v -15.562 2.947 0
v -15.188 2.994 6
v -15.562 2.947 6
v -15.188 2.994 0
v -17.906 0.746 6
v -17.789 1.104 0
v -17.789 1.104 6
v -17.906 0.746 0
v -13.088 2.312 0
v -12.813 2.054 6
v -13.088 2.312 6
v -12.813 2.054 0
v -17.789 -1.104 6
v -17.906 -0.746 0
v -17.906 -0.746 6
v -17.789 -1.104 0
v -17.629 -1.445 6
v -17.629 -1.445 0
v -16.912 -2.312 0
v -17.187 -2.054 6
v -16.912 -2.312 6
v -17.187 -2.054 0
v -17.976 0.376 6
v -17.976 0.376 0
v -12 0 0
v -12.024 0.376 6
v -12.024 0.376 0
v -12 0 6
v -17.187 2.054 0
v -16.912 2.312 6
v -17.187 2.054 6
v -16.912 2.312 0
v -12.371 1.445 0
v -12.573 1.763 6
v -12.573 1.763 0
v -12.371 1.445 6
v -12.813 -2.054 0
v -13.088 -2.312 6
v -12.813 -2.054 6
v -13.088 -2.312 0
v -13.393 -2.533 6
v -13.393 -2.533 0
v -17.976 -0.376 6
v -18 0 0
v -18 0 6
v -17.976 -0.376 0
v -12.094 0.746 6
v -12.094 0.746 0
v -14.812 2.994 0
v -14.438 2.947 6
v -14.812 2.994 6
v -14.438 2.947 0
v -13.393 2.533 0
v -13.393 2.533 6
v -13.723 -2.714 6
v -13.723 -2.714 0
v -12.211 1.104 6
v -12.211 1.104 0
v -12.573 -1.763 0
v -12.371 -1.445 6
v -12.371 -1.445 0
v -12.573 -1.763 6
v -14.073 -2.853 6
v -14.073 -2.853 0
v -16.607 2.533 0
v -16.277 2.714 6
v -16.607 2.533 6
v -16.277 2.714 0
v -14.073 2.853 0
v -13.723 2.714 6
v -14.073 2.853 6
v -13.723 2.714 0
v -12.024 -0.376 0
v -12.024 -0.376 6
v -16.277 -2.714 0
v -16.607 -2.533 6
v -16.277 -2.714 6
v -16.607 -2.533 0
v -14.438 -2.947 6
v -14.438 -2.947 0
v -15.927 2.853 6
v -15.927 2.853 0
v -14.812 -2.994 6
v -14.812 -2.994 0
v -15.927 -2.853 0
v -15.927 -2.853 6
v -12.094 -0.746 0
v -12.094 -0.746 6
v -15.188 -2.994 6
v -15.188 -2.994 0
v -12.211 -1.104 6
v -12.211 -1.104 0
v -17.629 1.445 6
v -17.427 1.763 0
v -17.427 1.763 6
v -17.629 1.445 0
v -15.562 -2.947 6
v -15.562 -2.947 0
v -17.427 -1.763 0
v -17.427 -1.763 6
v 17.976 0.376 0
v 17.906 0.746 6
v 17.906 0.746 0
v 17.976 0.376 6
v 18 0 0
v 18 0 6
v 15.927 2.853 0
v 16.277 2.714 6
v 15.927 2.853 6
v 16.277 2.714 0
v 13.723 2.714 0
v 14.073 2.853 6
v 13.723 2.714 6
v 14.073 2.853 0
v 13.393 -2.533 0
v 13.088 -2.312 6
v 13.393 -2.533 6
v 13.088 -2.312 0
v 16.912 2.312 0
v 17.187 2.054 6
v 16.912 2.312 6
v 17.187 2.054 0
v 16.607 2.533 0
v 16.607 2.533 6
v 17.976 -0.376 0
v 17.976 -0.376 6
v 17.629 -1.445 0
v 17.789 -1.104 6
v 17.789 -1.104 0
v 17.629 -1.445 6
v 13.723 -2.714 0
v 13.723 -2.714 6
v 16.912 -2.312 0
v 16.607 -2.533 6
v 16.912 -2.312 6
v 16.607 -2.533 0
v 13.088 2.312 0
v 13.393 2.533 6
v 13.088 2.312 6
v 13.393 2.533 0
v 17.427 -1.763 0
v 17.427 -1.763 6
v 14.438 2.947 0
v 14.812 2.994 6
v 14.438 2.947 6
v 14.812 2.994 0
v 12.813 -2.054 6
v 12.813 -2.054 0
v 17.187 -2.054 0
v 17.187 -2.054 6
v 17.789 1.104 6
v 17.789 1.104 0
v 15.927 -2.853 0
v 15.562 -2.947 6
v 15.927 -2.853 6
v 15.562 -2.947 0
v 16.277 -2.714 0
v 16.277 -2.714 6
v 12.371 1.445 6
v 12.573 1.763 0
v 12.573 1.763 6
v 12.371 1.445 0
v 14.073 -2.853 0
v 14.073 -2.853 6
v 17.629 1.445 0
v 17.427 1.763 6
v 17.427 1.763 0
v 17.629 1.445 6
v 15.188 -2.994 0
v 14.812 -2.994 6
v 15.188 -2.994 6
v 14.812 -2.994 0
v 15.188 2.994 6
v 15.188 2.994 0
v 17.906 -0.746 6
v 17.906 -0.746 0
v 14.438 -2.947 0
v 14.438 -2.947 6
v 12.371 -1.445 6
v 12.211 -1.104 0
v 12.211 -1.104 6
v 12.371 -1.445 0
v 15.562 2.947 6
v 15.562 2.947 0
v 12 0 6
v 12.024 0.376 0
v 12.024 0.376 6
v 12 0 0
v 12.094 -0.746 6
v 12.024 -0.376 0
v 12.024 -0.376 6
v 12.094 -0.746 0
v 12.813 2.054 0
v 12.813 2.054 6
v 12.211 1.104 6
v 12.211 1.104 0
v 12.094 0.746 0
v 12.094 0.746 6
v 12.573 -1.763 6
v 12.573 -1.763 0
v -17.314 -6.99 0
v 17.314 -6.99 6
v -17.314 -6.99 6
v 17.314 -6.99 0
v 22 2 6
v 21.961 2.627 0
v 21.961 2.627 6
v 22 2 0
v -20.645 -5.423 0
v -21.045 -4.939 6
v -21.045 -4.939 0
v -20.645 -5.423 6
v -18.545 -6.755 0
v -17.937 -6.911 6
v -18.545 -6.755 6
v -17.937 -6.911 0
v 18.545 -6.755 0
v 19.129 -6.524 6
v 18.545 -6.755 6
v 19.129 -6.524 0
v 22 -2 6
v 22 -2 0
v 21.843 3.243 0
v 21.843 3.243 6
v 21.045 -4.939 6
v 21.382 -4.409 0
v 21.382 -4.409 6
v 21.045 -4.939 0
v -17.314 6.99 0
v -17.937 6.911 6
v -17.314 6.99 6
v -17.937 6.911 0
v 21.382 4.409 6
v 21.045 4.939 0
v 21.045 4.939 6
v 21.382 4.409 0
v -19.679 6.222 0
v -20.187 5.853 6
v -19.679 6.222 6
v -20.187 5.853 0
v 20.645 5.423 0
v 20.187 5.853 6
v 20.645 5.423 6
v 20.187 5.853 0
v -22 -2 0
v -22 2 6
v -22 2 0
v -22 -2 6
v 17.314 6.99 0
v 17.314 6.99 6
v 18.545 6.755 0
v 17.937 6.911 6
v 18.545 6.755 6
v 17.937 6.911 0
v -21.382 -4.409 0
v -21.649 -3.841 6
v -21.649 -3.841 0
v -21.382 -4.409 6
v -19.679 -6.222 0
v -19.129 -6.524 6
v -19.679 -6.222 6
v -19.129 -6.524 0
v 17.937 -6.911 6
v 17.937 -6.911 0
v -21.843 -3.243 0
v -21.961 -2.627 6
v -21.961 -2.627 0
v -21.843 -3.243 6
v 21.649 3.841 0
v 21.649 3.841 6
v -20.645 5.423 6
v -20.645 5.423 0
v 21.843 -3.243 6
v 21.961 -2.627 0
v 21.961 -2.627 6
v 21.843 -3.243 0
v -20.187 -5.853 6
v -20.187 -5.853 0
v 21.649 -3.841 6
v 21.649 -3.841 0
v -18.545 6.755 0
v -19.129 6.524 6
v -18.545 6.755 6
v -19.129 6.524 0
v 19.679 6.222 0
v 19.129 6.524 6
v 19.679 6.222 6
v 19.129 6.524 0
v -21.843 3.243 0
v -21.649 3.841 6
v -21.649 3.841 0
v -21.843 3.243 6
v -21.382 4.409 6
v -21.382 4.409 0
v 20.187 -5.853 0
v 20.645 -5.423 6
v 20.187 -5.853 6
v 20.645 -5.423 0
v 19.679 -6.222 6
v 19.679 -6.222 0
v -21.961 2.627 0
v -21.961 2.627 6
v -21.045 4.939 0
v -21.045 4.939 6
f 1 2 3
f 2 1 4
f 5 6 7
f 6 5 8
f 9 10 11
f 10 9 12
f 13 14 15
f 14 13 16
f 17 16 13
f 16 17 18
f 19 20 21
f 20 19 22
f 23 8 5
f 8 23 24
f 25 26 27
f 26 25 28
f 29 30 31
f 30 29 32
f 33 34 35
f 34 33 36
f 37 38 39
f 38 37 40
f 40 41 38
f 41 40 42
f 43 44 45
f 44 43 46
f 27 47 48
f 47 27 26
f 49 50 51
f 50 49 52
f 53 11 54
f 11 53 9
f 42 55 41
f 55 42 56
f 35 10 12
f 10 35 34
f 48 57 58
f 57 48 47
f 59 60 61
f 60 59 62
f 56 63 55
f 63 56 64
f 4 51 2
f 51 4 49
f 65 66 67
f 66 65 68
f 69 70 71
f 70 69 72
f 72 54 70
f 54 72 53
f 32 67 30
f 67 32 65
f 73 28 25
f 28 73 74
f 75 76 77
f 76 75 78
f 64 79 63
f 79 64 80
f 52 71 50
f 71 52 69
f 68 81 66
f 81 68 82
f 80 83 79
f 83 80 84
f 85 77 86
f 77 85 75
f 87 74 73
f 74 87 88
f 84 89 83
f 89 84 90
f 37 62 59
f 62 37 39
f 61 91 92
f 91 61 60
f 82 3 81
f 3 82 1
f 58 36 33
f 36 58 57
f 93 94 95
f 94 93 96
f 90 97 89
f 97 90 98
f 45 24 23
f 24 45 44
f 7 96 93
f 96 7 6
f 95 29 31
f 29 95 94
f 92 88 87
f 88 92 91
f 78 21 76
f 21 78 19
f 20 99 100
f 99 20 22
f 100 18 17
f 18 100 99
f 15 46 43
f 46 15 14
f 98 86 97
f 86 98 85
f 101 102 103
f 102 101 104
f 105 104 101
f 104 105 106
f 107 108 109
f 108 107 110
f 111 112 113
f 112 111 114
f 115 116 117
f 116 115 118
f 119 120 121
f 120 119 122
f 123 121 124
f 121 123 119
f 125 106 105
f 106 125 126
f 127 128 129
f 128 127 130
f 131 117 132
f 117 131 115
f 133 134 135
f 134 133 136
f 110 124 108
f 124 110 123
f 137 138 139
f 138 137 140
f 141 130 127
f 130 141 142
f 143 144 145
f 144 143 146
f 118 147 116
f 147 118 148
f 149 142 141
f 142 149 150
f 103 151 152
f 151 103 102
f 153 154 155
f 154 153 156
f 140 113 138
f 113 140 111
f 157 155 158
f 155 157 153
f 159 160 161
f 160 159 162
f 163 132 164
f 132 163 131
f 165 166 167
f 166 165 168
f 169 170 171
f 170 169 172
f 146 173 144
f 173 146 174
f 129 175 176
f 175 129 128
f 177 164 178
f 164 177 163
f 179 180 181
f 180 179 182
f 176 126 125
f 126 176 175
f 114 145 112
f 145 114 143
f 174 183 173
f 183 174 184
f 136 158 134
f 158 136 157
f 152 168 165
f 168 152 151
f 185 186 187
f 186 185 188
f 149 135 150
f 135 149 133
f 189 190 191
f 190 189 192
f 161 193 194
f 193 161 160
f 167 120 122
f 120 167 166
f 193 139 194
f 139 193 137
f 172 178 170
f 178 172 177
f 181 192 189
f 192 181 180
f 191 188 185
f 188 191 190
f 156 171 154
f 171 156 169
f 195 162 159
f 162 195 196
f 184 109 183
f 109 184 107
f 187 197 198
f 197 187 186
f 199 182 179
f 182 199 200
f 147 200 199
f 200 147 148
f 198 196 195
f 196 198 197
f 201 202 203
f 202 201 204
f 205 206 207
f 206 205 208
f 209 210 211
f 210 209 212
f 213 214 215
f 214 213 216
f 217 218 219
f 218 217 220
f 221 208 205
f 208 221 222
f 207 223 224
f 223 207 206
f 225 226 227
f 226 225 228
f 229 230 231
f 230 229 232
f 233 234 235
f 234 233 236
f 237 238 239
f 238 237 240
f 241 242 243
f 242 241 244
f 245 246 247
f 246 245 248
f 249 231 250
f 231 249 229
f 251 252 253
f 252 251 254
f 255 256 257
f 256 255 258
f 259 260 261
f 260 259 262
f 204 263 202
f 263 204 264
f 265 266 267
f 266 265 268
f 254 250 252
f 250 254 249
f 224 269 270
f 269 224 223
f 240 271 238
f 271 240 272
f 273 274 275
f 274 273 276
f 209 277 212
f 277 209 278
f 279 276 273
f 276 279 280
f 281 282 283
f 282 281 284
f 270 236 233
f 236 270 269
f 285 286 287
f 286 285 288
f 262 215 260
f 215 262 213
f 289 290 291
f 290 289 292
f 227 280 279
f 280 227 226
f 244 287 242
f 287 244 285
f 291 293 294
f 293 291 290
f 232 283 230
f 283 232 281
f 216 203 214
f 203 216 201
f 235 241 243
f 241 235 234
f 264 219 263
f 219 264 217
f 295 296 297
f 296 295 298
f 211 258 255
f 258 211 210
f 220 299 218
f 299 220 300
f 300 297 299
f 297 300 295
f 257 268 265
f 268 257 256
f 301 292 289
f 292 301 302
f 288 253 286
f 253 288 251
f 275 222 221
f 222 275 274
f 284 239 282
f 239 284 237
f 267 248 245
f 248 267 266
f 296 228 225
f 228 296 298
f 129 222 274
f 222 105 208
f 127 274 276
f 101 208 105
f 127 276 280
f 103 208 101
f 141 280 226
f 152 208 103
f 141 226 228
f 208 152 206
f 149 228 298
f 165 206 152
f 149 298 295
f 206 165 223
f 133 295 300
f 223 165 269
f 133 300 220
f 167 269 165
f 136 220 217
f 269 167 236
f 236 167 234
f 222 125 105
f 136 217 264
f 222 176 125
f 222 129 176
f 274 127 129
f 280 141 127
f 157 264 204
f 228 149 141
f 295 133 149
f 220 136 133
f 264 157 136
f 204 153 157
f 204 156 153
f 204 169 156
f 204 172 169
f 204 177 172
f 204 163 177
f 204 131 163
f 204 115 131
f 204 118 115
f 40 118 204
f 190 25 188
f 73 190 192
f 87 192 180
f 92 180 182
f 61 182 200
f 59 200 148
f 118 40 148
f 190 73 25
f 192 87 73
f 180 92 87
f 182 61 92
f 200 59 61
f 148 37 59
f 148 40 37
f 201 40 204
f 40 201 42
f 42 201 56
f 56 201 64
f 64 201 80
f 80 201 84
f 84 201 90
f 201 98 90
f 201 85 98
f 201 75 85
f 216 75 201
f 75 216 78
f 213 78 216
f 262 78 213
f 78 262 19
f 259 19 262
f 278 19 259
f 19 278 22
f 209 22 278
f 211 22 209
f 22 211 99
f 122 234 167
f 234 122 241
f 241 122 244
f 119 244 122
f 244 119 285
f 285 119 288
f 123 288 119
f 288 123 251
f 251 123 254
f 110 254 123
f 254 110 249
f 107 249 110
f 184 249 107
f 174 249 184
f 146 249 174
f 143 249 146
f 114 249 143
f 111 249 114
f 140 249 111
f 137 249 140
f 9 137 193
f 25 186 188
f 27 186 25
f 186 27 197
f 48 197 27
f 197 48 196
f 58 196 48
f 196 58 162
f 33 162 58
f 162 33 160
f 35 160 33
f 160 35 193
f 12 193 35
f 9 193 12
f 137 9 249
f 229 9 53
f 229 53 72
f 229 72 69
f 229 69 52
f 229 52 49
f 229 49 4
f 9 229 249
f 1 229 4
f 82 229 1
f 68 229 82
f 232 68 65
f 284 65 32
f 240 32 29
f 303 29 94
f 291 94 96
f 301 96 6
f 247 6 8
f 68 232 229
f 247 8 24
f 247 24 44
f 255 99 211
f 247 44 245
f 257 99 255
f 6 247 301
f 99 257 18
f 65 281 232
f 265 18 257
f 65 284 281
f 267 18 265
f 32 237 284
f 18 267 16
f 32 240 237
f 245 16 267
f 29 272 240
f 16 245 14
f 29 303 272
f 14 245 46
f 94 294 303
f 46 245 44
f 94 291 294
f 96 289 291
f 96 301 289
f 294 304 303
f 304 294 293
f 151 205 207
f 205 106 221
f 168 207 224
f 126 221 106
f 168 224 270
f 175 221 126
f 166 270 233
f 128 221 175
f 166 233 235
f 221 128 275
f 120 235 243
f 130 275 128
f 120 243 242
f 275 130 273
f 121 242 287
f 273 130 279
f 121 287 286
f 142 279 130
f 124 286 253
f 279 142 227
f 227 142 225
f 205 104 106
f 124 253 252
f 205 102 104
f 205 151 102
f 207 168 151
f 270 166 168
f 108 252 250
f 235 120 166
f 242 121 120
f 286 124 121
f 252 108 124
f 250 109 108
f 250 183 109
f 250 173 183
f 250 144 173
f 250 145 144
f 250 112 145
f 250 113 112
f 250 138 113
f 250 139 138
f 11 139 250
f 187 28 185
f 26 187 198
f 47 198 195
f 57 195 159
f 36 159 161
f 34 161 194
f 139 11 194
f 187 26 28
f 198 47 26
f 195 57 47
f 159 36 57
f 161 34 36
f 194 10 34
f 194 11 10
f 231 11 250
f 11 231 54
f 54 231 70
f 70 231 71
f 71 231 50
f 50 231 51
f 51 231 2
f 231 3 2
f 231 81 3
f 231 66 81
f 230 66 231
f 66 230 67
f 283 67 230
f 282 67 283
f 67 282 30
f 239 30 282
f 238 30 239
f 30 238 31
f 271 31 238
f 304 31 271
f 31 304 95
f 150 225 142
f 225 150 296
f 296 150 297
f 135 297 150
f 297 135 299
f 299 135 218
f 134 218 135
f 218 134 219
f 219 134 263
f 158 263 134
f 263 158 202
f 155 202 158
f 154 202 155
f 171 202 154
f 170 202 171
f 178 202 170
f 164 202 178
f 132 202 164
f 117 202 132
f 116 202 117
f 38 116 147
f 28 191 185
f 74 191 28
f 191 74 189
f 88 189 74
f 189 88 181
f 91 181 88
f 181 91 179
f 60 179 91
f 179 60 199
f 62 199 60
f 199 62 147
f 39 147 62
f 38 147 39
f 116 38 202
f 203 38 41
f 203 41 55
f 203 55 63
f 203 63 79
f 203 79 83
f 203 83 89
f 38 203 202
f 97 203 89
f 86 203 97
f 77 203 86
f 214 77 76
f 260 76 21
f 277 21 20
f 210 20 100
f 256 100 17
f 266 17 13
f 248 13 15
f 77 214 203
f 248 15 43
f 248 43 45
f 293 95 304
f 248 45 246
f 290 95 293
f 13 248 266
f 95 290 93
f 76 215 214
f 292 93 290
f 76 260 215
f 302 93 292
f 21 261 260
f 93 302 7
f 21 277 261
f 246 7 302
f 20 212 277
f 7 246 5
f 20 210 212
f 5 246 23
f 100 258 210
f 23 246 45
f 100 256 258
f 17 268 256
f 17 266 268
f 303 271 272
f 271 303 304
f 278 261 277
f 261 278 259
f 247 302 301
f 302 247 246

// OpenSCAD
$fn = 50;


difference() {
	union() {
		hull() {
			translate(v = [-17.0000000000, 2.0000000000, 0]) {
				cylinder(h = 6, r = 5);
			}
			translate(v = [17.0000000000, 2.0000000000, 0]) {
				cylinder(h = 6, r = 5);
			}
			translate(v = [-17.0000000000, -2.0000000000, 0]) {
				cylinder(h = 6, r = 5);
			}
			translate(v = [17.0000000000, -2.0000000000, 0]) {
				cylinder(h = 6, r = 5);
			}
		}
	}
	union() {
		translate(v = [-15.0000000000, 0.0000000000, -100.0000000000]) {
			cylinder(h = 200, r = 3.0000000000);
		}
		translate(v = [-15.0000000000, 0.0000000000, -100.0000000000]) {
			cylinder(h = 200, r = 3.0000000000);
		}
		translate(v = [15.0000000000, 0.0000000000, -100.0000000000]) {
			cylinder(h = 200, r = 3.0000000000);
		}
		translate(v = [15.0000000000, 0.0000000000, -100.0000000000]) {
			cylinder(h = 200, r = 3.0000000000);
		}
	}
}
